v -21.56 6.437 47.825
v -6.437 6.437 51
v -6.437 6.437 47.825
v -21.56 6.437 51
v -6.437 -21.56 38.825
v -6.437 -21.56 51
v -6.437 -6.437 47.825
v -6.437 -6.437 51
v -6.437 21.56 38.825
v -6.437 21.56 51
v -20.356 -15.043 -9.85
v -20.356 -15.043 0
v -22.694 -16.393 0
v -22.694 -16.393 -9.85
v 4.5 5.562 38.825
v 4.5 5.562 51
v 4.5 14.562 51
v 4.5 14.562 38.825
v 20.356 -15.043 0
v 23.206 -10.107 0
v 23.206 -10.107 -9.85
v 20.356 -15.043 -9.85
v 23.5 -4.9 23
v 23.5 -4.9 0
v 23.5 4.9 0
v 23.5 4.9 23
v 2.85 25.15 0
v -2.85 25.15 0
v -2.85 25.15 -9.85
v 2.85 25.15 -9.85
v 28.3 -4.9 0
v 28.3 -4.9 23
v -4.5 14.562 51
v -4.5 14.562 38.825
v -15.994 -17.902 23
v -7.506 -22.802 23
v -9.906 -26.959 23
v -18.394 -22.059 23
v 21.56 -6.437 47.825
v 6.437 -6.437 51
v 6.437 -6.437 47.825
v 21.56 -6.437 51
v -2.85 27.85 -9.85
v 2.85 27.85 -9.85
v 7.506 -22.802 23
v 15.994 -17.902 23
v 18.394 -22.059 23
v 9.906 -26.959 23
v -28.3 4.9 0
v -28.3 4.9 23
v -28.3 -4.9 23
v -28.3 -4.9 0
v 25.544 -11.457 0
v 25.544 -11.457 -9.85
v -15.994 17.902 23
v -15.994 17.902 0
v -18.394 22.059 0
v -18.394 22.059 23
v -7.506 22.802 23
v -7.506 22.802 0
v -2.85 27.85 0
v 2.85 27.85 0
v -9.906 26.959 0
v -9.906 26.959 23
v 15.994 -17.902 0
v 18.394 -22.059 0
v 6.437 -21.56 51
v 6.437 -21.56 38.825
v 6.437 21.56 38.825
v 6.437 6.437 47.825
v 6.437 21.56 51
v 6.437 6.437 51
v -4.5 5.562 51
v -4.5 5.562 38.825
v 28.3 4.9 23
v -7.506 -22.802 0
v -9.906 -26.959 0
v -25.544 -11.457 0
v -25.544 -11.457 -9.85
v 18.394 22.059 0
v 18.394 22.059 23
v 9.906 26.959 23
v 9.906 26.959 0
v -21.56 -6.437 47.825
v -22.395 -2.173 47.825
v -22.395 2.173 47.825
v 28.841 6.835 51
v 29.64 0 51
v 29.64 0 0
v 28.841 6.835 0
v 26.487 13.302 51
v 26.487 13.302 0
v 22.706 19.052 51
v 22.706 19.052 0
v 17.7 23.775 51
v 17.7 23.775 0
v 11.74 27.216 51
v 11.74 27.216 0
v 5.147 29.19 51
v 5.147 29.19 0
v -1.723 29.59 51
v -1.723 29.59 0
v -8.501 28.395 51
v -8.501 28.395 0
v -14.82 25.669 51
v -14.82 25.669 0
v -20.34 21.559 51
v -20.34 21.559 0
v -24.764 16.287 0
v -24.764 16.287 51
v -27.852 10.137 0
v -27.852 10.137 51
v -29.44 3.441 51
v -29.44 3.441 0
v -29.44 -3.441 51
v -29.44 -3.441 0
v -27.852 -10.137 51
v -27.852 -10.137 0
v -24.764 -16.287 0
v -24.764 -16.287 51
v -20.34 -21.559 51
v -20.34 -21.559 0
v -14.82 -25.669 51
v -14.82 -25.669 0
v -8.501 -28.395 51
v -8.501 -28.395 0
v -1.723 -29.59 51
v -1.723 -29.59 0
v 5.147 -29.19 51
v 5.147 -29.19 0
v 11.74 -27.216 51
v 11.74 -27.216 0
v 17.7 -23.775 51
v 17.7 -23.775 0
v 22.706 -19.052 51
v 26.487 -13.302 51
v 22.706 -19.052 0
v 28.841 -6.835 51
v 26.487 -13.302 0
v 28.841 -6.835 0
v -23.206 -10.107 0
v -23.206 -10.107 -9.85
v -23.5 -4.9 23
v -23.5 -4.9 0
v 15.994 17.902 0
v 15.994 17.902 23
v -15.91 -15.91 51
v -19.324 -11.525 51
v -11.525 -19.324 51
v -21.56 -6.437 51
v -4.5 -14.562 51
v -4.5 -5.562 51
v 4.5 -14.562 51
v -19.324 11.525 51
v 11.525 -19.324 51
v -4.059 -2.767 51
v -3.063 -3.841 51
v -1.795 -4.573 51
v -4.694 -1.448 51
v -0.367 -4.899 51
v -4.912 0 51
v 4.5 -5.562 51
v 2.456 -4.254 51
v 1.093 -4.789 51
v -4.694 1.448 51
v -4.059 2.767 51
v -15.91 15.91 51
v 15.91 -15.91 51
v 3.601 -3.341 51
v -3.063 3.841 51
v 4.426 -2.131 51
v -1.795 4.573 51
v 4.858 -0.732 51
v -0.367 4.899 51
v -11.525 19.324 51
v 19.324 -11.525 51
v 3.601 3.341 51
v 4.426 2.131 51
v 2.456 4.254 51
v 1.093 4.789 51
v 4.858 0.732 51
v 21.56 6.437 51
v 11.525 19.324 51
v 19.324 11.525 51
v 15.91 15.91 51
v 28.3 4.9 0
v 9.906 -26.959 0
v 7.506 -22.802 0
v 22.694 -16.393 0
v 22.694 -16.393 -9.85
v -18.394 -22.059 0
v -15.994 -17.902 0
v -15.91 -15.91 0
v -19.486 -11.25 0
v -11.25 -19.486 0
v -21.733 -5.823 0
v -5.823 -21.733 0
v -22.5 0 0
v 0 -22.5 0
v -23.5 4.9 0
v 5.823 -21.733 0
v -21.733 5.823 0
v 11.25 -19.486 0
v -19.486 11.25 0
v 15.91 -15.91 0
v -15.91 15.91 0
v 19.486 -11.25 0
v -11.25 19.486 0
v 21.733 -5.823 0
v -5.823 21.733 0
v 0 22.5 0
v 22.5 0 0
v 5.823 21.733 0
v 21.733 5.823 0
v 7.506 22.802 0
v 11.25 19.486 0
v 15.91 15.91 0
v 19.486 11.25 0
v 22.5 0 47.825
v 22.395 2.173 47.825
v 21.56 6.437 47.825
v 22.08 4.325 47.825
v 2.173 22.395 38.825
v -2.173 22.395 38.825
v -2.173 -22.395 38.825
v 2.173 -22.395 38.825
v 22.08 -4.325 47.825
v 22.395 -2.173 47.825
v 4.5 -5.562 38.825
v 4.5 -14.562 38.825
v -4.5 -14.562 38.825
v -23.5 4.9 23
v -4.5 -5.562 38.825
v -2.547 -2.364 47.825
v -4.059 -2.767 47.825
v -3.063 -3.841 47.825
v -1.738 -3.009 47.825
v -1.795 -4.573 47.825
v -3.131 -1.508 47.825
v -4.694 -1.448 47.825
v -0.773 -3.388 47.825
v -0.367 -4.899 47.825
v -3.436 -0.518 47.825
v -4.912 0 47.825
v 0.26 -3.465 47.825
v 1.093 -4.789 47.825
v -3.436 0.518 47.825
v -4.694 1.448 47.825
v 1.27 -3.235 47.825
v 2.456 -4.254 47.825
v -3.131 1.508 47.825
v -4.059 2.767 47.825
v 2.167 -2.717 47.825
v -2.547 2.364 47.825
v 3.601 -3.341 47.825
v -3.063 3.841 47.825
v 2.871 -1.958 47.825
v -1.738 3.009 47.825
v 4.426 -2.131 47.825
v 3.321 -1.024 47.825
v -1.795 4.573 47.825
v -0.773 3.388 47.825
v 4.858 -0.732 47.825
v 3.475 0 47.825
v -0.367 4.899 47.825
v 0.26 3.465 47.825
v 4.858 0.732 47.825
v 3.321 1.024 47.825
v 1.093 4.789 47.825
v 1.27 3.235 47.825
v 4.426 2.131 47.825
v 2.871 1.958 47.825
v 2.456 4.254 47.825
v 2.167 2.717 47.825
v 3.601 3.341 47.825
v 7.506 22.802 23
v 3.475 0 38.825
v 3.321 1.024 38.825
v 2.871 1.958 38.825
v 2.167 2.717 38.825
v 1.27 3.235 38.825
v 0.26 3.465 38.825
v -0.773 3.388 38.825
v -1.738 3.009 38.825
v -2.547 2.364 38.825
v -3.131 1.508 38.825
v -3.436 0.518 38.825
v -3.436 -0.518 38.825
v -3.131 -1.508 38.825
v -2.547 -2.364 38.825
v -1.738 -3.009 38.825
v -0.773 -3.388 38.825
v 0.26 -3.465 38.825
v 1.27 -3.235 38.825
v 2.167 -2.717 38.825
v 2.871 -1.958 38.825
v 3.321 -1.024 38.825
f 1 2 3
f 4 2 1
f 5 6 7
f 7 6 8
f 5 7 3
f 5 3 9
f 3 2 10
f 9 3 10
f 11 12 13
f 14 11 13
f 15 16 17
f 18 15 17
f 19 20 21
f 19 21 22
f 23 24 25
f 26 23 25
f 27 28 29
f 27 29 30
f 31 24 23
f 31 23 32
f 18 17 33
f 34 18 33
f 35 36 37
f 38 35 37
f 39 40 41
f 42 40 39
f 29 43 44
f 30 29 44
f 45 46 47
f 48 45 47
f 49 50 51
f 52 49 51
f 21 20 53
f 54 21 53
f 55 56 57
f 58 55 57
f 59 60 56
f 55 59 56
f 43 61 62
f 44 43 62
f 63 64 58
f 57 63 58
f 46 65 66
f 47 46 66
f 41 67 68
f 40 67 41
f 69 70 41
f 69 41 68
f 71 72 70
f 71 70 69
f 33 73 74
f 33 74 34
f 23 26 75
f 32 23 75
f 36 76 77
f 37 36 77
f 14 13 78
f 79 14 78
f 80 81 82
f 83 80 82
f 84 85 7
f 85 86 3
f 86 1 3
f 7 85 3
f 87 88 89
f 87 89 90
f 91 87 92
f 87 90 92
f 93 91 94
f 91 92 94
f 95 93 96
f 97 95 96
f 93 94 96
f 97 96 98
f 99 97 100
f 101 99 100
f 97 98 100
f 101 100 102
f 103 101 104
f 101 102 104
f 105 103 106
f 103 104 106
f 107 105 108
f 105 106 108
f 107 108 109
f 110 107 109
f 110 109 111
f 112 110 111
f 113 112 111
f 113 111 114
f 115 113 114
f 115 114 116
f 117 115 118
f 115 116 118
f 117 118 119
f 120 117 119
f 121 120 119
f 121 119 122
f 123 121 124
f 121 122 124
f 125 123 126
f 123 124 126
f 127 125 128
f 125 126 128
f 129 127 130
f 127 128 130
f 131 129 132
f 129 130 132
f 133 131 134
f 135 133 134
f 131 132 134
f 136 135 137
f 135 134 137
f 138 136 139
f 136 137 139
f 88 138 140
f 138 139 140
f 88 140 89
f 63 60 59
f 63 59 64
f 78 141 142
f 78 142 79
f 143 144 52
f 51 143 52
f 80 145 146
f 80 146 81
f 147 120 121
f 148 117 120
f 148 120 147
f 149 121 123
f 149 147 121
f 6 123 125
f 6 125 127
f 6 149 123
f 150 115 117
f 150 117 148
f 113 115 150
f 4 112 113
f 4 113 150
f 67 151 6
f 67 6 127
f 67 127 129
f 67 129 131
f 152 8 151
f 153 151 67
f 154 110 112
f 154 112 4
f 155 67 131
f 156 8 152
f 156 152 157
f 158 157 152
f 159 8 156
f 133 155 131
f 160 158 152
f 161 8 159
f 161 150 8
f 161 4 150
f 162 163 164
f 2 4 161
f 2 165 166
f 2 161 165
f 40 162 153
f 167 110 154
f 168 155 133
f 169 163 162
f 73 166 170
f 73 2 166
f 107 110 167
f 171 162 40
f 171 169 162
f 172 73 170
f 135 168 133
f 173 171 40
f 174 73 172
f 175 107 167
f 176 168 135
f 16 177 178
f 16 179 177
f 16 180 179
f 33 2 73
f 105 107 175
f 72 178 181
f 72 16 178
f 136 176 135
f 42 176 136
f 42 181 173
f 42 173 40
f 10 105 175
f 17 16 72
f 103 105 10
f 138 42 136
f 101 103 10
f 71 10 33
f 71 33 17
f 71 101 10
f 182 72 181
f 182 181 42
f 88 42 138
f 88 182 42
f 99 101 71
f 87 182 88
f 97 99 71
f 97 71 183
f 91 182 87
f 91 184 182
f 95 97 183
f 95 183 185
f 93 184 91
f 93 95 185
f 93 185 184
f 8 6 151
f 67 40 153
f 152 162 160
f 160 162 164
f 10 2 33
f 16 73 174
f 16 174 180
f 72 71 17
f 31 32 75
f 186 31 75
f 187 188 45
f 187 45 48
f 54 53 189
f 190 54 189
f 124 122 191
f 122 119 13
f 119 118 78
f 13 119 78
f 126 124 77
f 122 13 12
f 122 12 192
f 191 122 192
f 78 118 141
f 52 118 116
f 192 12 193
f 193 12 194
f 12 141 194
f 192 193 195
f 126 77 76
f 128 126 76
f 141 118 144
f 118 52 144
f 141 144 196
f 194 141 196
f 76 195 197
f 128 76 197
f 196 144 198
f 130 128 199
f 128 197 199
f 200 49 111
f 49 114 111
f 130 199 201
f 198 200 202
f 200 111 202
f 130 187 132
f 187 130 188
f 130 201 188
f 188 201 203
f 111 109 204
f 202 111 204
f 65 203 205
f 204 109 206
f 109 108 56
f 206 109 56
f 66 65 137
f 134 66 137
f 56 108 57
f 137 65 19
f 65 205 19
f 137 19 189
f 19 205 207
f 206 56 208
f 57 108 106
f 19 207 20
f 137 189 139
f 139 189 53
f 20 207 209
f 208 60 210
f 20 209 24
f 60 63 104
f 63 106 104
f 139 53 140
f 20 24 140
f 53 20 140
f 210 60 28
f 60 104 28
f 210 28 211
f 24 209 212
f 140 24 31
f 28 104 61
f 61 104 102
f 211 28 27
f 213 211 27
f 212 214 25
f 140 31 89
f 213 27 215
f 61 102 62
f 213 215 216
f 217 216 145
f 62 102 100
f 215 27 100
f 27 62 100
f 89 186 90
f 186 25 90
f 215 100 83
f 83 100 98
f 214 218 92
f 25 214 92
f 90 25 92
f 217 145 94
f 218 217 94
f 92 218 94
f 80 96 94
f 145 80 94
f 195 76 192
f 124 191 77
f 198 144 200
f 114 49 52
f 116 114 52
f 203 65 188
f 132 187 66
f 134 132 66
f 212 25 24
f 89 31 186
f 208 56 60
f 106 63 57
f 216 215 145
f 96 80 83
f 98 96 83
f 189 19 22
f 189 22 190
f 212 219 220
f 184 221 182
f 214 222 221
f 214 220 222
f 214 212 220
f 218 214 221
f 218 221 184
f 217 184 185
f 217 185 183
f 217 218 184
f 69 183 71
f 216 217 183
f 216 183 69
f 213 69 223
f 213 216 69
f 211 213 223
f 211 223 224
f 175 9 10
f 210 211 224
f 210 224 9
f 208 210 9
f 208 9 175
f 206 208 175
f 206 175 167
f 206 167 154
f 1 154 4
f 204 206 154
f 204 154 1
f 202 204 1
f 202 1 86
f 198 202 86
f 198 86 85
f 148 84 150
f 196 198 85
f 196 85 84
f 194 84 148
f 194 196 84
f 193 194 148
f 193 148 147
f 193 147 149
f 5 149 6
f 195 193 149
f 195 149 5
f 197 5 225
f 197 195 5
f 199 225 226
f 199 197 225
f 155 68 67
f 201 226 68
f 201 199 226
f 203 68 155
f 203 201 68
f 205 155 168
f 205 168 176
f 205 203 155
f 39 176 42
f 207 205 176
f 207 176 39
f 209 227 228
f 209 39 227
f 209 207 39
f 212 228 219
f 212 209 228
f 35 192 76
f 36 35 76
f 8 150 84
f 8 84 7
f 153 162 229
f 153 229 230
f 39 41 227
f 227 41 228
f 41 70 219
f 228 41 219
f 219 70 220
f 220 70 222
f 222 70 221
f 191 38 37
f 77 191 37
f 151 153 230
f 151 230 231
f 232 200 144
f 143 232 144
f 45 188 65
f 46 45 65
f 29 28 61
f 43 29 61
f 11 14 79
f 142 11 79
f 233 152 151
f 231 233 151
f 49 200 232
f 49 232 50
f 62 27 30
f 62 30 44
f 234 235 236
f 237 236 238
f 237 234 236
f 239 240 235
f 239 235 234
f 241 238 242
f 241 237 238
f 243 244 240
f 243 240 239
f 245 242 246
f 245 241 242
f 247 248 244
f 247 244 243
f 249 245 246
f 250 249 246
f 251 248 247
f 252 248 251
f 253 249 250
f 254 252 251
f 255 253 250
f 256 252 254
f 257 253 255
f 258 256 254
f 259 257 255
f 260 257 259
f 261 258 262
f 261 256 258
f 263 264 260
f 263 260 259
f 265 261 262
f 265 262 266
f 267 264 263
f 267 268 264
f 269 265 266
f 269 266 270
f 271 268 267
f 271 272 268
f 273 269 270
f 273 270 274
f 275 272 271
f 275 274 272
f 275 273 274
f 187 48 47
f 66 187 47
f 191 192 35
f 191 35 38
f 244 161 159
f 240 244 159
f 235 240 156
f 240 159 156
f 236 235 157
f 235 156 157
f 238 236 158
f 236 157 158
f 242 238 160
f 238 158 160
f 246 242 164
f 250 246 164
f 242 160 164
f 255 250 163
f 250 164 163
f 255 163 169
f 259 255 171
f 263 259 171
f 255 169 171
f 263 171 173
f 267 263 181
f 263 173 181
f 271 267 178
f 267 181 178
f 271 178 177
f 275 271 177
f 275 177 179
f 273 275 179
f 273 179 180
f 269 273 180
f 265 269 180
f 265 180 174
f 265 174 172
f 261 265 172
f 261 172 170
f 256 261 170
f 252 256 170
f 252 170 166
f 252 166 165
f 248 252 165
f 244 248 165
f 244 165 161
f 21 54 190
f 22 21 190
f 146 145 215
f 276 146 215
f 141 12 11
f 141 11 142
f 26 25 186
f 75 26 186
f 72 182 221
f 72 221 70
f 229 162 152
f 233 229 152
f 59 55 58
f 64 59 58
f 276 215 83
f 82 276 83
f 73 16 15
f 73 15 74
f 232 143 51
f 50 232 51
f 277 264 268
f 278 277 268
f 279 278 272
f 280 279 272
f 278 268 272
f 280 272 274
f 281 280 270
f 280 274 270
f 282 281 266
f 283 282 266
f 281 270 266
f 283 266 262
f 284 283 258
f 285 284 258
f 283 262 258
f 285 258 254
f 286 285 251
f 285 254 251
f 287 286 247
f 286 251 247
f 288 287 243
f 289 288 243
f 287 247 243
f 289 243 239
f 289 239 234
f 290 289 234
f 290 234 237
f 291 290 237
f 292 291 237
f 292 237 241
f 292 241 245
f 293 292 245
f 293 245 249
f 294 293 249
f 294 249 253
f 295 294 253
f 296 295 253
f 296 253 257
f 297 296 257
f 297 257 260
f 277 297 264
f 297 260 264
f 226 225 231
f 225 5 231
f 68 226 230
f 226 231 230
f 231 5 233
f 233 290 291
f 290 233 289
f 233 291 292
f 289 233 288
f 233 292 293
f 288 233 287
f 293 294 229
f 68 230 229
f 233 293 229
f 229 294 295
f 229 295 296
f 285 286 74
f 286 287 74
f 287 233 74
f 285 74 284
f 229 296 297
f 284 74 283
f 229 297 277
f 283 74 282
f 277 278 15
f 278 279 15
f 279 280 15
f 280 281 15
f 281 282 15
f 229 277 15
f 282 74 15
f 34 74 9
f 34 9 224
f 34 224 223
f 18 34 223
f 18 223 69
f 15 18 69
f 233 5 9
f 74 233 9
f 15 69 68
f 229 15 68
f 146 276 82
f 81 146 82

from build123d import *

# Parameters (mm, degrees)
SKETCH1_R                      = 29.64
SKETCH1_R_2                    = 22.5
BOSS_EXTRUDE1_DEPTH            = 51
SKETCH1_4_W                    = 5.7
SKETCH1_4_H                    = 2.7
BOSS_EXTRUDE2_DEPTH            = 9.85
CIRPATTERN2_COUNT              = 3
BOSS_EXTRUDE3_DEPTH            = 3.175
CUT_EXTRUDE2_REACH             = 75.89
SKETCH7_R                      = 4.9125
CUT_EXTRUDE2_DIRECTION_2_DEPTH = 74.890335633
SKETCH8_W                      = 12.873355566
SKETCH8_H                      = 48.17275248
SKETCH8_R                      = 3.475
BOSS_EXTRUDE4_DEPTH            = 9
SKETCH1_3_W                    = 4.8
SKETCH1_3_H                    = 9.8
CUT_EXTRUDE1_DEPTH             = 23
CIRPATTERN1_COUNT              = 6
SKETCH11_W                     = 9
SKETCH11_H                     = 9
CUT_EXTRUDE21_DEPTH            = 29


with BuildPart() as part:
    # Sketch1 → Boss-Extrude1 (new body)
    with BuildSketch(Plane.XY):
        Circle(SKETCH1_R)
        Circle(SKETCH1_R_2, mode=Mode.SUBTRACT)
    extrude(amount=BOSS_EXTRUDE1_DEPTH)

    # Sketch1<4> → Boss-Extrude2 (add)
    with BuildSketch(Plane.XY):
        with Locations((0, 26.5)):
            Rectangle(SKETCH1_4_W, SKETCH1_4_H)
    boss_extrude2 = extrude(amount=-BOSS_EXTRUDE2_DEPTH)

    # CirPattern2: Boss-Extrude2 ×3 about axis
    cirpattern2_axis = Axis((0, 0, 0), (0, 0, 1))
    for i in range(1, CIRPATTERN2_COUNT):
        add(boss_extrude2.rotate(cirpattern2_axis, i * 360 / CIRPATTERN2_COUNT))

    # Sketch4 → Boss-Extrude3 (add)
    with BuildSketch(Plane.XY.offset(51)):
        Polygon((-6.436677783, -24.214121516), (6.436677783, -24.214121516), (6.436677783, -6.436677783), (24.214121516, -6.436677783), (24.214121516, 6.436677783), (6.436677783, 6.436677783), (6.436677783, 24.214121516), (-6.436677783, 24.214121516), (-6.436677783, 6.436677783), (-24.214121516, 6.436677783), (-24.214121516, -6.436677783), (-6.436677783, -6.436677783), align=None)
    extrude(amount=-BOSS_EXTRUDE3_DEPTH)

    # Sketch7 → Cut-Extrude2 (cut, up to next)
    with BuildSketch(Plane.XY.offset(51), mode=Mode.PRIVATE) as cut_extrude2_sk1:
        with Locations(Location((0, 0, 0), (0, 0, 180))):
            Circle(SKETCH7_R)
    cut_extrude2_tool1 = extrude(cut_extrude2_sk1.sketch, amount=-CUT_EXTRUDE2_REACH, mode=Mode.PRIVATE) & part.part
    add(cut_extrude2_tool1.solids().sort_by_distance((0, 0, 51))[0], mode=Mode.SUBTRACT)

    # Sketch7 → Cut-Extrude2 direction 2 (cut)
    with BuildSketch(Plane.XY.offset(51)):
        with Locations(Location((0, 0, 0), (0, 0, 180))):
            Circle(SKETCH7_R)
    extrude(amount=CUT_EXTRUDE2_DIRECTION_2_DEPTH, mode=Mode.SUBTRACT)

    # Sketch8 → Boss-Extrude4 (add)
    with BuildSketch(Plane.XY.offset(47.825)):
        Rectangle(SKETCH8_W, SKETCH8_H)
        Circle(SKETCH8_R, mode=Mode.SUBTRACT)
    extrude(amount=-BOSS_EXTRUDE4_DEPTH)

    # Sketch1<3> → Cut-Extrude1 (cut)
    with BuildSketch(Plane.XY):
        with Locations((25.9, 0)):
            Rectangle(SKETCH1_3_W, SKETCH1_3_H)
    cut_extrude1 = extrude(amount=CUT_EXTRUDE1_DEPTH, mode=Mode.SUBTRACT)

    # CirPattern1: Cut-Extrude1 ×6 about axis
    cirpattern1_axis = Axis((0, 0, 0), (0, 0, 1))
    for i in range(1, CIRPATTERN1_COUNT):
        add(cut_extrude1.rotate(cirpattern1_axis, i * 360 / CIRPATTERN1_COUNT), mode=Mode.SUBTRACT)

    # Sketch11 → Cut-Extrude21 (cut)
    with BuildSketch(Plane(origin=(0, 0, 51), x_dir=(-1, 0, 0), z_dir=(0, 0, -1))):
        with Locations((0, 10.0625)):
            Rectangle(SKETCH11_W, SKETCH11_H)
    cut_extrude21 = extrude(amount=CUT_EXTRUDE21_DEPTH, mode=Mode.SUBTRACT)

    # Mirror1: Cut-Extrude21 across plane
    add(cut_extrude21.mirror(Plane.ZX), mode=Mode.SUBTRACT)


solid = part.part
